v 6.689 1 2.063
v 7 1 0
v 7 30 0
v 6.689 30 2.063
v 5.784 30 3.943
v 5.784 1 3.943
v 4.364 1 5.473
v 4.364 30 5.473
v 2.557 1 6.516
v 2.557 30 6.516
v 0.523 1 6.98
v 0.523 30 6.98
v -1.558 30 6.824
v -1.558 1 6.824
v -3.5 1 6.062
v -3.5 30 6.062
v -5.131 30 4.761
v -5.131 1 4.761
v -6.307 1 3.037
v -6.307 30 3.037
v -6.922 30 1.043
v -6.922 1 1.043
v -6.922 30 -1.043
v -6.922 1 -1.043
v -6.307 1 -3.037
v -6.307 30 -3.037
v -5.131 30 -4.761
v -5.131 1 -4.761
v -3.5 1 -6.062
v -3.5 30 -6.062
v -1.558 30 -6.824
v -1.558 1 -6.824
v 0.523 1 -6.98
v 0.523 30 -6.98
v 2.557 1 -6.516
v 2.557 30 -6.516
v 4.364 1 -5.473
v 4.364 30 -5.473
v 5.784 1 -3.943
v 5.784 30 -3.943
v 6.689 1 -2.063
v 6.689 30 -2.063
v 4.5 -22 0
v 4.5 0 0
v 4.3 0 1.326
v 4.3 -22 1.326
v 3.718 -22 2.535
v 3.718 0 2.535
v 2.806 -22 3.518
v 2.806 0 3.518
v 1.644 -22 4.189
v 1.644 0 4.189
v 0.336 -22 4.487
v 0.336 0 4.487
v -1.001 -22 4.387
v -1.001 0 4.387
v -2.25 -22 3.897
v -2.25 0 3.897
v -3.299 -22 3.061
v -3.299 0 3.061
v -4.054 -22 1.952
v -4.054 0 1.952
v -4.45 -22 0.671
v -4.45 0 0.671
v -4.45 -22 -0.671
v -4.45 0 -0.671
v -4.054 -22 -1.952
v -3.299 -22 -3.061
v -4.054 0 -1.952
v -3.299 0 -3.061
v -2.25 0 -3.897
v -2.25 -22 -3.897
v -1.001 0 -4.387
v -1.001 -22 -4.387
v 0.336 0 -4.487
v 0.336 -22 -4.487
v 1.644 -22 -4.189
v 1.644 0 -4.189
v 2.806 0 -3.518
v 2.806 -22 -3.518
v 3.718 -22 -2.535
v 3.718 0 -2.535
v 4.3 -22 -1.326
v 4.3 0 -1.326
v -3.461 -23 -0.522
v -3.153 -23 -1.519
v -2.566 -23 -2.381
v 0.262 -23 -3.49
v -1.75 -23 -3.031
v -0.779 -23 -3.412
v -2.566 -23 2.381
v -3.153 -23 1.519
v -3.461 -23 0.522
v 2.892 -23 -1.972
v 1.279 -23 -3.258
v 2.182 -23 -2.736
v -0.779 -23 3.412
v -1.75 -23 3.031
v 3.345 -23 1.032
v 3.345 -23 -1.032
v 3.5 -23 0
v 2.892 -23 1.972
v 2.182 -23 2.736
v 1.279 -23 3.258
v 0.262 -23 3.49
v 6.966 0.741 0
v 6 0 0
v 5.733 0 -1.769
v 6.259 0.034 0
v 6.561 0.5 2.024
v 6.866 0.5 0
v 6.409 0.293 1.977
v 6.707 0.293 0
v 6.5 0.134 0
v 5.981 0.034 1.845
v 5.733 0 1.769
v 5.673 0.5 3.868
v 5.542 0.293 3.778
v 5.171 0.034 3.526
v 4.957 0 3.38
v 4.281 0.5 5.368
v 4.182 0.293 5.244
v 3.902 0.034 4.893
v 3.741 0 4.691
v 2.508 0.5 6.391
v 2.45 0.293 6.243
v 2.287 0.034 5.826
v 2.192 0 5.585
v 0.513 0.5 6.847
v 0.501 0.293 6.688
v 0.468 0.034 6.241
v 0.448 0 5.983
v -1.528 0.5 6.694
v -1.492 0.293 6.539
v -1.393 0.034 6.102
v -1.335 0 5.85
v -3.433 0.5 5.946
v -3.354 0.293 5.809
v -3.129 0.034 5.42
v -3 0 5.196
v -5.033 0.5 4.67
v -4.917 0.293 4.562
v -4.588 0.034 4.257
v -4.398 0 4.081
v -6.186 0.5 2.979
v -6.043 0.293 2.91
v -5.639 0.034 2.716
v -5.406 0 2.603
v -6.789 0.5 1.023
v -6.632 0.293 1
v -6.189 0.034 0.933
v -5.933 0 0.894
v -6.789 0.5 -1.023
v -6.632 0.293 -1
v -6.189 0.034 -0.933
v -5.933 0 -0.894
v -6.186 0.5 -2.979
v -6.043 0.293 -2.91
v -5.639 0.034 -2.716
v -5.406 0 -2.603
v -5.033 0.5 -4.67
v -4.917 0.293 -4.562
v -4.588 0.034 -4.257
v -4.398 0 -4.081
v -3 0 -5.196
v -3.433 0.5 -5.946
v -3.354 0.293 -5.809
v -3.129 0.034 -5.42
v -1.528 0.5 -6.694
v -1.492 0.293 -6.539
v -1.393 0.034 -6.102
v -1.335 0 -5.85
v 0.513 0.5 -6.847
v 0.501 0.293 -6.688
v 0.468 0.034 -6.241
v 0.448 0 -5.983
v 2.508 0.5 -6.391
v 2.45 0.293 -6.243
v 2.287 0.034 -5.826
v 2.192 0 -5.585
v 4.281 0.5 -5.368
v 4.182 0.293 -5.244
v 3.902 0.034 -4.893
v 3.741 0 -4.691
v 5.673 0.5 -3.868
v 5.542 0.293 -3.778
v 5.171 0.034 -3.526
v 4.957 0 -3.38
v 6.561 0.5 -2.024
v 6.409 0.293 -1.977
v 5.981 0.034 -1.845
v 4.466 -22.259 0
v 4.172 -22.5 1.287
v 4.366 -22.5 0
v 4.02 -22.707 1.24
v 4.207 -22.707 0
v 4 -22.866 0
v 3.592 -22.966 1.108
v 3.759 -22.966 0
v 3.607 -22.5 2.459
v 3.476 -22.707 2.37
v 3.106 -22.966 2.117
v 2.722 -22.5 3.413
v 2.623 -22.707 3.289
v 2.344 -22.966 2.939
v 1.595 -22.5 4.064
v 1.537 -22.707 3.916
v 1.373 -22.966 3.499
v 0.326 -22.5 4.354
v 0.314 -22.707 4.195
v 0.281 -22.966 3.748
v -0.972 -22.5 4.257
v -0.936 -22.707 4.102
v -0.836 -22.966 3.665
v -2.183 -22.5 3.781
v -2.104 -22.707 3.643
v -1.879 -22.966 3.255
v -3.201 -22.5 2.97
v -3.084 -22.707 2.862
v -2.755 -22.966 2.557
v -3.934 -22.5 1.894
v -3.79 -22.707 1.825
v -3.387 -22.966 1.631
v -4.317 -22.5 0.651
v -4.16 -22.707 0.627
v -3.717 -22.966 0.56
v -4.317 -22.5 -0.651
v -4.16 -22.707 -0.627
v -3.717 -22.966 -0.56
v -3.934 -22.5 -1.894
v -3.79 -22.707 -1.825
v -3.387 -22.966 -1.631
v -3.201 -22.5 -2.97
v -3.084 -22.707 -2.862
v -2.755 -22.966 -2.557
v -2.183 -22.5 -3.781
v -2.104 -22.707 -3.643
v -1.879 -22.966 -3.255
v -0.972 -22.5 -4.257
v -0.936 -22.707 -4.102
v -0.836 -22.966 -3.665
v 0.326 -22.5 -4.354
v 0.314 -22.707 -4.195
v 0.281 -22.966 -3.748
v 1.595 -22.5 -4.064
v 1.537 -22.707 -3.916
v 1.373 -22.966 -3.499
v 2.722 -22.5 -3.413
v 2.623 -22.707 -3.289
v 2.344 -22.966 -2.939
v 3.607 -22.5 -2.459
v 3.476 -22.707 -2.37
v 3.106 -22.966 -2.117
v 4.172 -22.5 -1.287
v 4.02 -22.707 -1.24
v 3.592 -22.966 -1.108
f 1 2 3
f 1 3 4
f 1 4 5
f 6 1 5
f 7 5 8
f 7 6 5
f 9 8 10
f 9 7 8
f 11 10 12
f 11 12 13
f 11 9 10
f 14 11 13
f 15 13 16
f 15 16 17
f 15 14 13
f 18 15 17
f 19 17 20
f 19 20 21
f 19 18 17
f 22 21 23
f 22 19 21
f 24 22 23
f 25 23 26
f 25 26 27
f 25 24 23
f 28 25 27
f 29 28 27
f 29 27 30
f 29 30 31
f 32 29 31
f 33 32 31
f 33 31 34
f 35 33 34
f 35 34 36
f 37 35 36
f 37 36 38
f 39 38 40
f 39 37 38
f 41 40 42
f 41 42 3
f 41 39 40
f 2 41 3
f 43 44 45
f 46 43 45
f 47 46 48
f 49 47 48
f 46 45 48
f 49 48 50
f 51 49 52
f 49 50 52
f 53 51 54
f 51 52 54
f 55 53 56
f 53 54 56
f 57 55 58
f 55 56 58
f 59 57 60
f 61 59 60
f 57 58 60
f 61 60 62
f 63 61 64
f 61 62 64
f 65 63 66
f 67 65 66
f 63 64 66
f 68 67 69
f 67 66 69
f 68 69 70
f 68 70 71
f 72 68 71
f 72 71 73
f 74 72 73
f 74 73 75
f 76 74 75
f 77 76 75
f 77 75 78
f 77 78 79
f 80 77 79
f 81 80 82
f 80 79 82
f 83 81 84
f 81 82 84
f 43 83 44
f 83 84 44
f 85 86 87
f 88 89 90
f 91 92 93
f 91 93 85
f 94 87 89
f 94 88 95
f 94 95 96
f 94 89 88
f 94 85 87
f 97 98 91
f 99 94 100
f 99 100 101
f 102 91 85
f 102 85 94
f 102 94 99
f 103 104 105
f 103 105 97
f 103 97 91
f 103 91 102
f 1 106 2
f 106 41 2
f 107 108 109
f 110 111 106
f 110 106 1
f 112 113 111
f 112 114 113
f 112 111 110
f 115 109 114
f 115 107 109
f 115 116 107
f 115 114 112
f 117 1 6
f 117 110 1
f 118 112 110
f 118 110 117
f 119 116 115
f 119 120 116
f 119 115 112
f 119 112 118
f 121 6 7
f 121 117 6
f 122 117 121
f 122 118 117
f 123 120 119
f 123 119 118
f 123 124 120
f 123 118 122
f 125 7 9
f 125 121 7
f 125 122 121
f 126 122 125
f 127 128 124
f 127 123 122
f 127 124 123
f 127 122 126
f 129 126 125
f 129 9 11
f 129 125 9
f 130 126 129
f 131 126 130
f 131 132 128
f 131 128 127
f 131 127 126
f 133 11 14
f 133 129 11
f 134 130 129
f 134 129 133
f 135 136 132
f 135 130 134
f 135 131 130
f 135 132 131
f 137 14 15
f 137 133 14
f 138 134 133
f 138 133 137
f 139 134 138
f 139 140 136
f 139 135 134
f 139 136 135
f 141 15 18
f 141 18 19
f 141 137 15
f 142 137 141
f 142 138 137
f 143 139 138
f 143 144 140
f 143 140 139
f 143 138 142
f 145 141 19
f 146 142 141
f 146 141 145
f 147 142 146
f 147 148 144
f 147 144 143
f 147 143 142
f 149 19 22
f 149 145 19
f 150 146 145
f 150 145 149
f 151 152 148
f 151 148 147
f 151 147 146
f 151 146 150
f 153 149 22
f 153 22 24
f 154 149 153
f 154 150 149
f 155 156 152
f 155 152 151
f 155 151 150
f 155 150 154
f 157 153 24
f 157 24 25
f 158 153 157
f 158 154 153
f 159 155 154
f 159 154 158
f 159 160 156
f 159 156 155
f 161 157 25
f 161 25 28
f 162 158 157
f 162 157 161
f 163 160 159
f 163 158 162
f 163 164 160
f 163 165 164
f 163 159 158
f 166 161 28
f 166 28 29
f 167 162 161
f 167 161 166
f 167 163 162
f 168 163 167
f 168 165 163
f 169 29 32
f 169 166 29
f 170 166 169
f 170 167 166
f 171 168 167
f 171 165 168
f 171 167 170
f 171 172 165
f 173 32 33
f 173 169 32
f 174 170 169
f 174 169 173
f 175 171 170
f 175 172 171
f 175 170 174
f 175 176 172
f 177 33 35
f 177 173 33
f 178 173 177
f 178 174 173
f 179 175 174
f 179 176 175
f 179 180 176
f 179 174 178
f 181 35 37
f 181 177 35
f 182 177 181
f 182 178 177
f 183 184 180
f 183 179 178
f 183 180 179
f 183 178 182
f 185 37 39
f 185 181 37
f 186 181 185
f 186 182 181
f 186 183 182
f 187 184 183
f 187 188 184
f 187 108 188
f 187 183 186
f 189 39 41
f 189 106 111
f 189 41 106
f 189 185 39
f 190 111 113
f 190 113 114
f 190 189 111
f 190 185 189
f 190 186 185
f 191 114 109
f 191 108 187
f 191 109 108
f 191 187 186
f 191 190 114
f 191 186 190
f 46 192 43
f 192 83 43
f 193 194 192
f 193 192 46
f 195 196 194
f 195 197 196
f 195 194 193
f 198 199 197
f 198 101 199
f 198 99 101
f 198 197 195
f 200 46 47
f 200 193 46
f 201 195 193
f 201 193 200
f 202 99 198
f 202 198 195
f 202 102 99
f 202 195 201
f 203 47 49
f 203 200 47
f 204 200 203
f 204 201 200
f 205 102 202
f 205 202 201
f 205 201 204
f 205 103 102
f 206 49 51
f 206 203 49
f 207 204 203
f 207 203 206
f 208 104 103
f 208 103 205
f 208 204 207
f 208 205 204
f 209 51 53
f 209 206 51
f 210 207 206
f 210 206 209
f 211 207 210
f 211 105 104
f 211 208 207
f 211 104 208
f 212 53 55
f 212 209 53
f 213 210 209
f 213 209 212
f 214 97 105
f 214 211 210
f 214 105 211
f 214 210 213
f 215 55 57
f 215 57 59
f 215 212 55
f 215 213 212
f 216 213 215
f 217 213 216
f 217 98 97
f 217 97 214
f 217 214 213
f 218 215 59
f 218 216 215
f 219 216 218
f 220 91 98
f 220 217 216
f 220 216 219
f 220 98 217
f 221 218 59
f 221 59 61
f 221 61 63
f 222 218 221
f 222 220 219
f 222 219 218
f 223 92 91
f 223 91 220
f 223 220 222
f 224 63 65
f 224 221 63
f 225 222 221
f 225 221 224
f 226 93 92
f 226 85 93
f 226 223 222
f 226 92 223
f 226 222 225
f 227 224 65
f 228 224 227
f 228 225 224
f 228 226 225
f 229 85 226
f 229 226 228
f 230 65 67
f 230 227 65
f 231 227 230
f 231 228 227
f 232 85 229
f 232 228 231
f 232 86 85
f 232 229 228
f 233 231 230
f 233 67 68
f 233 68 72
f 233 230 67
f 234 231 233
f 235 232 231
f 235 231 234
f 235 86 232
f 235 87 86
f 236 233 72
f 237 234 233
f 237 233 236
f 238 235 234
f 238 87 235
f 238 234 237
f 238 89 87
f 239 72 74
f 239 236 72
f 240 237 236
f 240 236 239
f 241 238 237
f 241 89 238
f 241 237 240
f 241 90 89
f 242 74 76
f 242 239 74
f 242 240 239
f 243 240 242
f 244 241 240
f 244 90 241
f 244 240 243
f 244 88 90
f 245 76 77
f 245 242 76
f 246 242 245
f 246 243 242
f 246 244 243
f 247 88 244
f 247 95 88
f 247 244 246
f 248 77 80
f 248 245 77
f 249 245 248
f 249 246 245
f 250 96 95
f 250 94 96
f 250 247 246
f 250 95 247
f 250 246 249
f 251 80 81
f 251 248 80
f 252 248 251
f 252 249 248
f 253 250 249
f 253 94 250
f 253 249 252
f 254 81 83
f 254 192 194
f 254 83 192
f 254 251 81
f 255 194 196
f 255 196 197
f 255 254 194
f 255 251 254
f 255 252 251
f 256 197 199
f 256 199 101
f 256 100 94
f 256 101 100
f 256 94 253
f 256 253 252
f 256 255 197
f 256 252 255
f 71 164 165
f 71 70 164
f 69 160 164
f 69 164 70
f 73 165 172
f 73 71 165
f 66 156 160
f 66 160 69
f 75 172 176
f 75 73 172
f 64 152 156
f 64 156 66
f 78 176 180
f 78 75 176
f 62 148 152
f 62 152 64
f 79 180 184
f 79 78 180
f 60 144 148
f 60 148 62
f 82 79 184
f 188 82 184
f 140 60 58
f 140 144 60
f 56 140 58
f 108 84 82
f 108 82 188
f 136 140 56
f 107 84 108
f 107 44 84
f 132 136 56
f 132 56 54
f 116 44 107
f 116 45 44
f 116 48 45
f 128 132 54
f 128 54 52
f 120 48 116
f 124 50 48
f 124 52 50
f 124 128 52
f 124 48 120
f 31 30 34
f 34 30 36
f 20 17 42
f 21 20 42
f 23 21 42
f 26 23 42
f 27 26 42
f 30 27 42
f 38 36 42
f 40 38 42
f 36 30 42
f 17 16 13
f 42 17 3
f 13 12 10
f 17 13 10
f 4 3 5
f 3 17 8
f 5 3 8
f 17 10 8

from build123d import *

# Parameters (mm, degrees)
F0_R     = 7
F0_R_2   = 4.5
F1_DEPTH = 30
F2_DEPTH = 23
F3_R     = 1


with BuildPart() as f1:
    # F0 (on Front) → F1 (new body)
    with BuildSketch(Plane.XZ):
        Circle(F0_R)
        Circle(F0_R_2, mode=Mode.SUBTRACT)
        Circle(F0_R_2)
    extrude(amount=-F1_DEPTH)

    # F0 (on Front) → F2 (join)
    with BuildSketch(Plane.XZ):
        Circle(F0_R_2)
    extrude(amount=F2_DEPTH)

    # F3
    f3_edges = [f1.edges().sort_by_distance(p)[0] for p in [
        (-4.5, -23, 0),
        (-7, 0, 0),
    ]]
    fillet(f3_edges, radius=F3_R)


solid = f1.part
